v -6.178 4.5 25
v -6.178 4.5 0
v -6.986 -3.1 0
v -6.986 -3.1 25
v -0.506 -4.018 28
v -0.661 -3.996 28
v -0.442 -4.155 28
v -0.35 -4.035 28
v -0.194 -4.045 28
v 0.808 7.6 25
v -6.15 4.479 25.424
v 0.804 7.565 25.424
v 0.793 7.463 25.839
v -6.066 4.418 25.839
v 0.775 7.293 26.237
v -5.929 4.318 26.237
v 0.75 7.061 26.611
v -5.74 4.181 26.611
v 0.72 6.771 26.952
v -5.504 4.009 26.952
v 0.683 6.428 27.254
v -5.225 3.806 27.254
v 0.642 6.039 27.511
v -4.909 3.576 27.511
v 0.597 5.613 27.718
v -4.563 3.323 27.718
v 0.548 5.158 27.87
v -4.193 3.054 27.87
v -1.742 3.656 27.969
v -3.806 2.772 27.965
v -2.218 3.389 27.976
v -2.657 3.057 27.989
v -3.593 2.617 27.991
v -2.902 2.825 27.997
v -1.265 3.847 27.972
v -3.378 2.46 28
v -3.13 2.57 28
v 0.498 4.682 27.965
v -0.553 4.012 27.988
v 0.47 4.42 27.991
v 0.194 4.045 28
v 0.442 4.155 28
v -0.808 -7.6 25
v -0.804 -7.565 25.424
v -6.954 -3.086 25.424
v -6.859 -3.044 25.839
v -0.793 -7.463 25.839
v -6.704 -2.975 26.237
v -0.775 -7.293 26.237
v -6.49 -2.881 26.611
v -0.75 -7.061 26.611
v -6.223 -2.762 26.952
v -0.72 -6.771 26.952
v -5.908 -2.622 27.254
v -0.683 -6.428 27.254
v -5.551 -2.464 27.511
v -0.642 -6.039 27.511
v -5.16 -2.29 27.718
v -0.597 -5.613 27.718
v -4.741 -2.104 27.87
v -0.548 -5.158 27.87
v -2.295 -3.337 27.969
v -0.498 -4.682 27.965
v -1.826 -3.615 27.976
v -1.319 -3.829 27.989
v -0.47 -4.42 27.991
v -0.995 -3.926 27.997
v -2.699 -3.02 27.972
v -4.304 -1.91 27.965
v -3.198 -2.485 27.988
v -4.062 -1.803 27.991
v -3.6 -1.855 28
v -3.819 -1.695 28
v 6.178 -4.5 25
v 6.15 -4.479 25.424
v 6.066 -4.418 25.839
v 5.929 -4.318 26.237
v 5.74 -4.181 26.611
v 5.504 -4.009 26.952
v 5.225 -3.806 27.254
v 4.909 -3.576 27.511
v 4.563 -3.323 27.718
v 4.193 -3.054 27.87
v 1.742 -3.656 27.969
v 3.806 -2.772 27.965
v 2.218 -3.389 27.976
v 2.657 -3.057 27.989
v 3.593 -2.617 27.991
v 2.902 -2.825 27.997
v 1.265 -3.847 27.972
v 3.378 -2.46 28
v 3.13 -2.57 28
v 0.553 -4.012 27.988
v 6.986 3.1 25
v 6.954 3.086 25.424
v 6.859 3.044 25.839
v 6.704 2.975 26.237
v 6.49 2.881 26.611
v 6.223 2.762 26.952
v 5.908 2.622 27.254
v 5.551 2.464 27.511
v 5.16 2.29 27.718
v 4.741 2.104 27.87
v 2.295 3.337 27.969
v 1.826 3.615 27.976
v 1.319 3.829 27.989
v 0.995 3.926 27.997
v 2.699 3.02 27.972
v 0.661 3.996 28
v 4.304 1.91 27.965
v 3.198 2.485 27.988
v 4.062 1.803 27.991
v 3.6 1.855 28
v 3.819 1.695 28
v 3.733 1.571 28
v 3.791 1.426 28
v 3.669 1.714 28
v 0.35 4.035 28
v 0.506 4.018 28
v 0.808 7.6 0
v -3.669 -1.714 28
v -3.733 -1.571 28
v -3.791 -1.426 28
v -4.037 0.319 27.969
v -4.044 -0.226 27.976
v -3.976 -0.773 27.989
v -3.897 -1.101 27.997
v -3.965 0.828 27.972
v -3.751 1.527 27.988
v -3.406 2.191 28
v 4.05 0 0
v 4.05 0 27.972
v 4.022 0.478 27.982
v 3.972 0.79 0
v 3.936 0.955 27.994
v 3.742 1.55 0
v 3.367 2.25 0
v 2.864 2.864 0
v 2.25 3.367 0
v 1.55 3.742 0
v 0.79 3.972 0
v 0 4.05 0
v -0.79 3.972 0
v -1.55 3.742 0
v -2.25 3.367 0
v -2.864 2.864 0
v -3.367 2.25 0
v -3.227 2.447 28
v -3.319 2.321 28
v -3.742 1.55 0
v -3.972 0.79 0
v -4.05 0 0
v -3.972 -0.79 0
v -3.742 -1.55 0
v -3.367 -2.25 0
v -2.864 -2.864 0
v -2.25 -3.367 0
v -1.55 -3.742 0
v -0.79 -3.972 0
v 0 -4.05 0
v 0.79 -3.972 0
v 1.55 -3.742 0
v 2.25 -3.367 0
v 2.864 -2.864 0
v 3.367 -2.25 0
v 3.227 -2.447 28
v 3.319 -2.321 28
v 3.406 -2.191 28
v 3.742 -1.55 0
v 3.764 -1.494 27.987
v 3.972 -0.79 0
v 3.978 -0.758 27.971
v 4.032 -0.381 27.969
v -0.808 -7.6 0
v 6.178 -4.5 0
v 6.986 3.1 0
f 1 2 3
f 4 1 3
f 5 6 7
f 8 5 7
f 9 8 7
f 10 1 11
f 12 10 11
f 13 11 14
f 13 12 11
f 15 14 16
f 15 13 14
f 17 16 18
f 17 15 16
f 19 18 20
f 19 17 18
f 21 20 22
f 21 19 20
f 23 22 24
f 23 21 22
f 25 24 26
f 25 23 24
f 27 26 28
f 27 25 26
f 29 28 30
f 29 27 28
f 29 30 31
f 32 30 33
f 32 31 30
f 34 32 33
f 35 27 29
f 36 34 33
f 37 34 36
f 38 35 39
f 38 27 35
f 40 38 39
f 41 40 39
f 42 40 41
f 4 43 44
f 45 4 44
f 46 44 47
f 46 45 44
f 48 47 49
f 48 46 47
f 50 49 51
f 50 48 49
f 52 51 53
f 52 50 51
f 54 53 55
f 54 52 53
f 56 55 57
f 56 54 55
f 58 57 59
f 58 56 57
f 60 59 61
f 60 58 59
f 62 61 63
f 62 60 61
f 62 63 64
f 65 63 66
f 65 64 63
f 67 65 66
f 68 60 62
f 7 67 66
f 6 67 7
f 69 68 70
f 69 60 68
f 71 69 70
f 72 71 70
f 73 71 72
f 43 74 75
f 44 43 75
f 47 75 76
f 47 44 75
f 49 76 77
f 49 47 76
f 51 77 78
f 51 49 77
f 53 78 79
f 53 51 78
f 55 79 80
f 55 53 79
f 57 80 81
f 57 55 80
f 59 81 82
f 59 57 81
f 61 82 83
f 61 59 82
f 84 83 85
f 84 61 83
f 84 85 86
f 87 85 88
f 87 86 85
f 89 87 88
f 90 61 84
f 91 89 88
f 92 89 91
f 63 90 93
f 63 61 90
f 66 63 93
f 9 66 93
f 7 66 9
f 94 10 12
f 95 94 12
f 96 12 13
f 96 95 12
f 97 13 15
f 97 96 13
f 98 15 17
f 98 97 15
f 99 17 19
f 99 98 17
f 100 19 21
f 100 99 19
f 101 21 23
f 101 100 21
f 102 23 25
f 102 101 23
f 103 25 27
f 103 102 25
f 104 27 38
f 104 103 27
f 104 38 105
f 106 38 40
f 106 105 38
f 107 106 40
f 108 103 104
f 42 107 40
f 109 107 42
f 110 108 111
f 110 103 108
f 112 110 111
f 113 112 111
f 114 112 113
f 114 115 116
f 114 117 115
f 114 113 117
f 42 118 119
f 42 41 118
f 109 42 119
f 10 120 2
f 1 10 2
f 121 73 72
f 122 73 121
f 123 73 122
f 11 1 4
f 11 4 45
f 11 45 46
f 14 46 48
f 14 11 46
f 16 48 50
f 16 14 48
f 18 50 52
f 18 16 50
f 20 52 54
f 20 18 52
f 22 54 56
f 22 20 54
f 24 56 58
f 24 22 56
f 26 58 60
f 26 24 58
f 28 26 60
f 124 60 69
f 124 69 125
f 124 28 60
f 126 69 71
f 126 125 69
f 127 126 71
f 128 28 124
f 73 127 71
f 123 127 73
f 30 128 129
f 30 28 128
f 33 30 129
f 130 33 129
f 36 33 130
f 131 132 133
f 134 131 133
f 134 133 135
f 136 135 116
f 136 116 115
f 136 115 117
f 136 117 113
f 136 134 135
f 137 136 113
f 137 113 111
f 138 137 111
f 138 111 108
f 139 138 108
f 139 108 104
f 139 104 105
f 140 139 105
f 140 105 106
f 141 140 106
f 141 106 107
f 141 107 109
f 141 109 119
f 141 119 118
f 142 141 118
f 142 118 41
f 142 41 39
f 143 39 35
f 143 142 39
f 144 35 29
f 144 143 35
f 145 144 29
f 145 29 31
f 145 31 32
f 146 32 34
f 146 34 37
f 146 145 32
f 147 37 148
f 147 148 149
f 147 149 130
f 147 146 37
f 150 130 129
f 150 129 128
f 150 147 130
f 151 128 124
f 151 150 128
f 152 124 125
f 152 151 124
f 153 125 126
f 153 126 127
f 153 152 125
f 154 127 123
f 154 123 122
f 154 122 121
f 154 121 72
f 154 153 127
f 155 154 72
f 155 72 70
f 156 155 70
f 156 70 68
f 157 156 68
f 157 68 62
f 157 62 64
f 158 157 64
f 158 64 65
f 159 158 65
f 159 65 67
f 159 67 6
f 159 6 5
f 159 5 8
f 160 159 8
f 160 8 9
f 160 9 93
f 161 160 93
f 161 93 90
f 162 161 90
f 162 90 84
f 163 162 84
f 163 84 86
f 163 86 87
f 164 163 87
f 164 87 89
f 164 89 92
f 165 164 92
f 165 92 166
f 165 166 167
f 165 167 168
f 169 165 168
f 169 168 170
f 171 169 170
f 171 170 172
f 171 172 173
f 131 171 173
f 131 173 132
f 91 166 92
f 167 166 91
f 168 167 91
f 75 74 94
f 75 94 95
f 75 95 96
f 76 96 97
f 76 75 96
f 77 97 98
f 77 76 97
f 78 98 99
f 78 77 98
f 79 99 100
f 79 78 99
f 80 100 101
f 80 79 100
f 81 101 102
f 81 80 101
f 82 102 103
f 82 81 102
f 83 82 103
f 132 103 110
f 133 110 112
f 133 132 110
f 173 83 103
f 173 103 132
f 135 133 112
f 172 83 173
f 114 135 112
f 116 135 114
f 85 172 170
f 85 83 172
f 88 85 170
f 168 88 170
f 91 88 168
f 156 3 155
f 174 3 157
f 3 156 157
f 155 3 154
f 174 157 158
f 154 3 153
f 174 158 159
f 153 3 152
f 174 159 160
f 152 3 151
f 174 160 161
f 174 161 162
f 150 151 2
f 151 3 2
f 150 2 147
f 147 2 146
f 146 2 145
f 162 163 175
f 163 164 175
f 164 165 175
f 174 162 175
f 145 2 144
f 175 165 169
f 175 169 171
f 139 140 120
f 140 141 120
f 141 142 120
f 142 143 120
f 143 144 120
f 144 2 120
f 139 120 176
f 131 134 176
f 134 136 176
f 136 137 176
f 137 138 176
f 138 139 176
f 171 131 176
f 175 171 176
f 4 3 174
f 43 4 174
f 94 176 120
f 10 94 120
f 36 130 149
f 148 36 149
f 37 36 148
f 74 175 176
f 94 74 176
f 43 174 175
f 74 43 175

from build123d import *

# Parameters (mm, degrees)
F0_R         = 4.05
F1_DEPTH     = 28
F2_T1_DEPTH  = 22.6428048889
F2_T3_DEPTH  = 22.6428048889
F2_T5_DEPTH  = 22.6428048889
F2_T7_DEPTH  = 22.6428048889
F2_T9_DEPTH  = 22.6428048889
F2_T11_DEPTH = 22.6428048889


# Not quite as in the source:
# - a fillet or chamfer that OpenCascade refuses, or shapes differently, is made with other operations: its cross-section is extruded or revolved along the edge and cut away or added


with BuildPart() as f1:
    # F0 (on Top) → F1 (new body)
    with BuildSketch(Plane.XY):
        Polygon((6.1779160549, -4.4995355079), (6.9856700826, 3.1004644921), (0.8077540276, 7.6), (-6.1779160549, 4.4995355079), (-6.9856700826, -3.1004644921), (-0.8077540276, -7.6), align=None)
        Circle(F0_R, mode=Mode.SUBTRACT)
    extrude(amount=F1_DEPTH)

    # F2: fillet of radius 3 on 6 edges, made by hand

    # F2_s2 → F2_t1 (cut)
    with BuildSketch(Plane(origin=(-10.3479787197, -4.5927649325, 0), x_dir=(0, 0, 1), z_dir=(0.9140191571, 0.4056710249, 0))):
        with BuildLine():
            ThreePointArc((25, 6.6188631899), (27.1213203436, 5.7401835335), (28, 3.6188631899))
            Line((28, 3.6188631899), (28, 6.6188631899))
            Line((28, 6.6188631899), (25, 6.6188631899))
        make_face()
    extrude(amount=F2_T1_DEPTH, mode=Mode.SUBTRACT)

    # F2_s4 → F2_t3 (cut)
    with BuildSketch(Plane(origin=(-9.151440465, 6.6652299829, 0), x_dir=(0, 0, 1), z_dir=(0.8083309917, -0.5887282972, 0))):
        with BuildLine():
            ThreePointArc((25, 6.6188631899), (27.1213203436, 5.7401835335), (28, 3.6188631899))
            Line((28, 3.6188631899), (28, 6.6188631899))
            Line((28, 6.6188631899), (25, 6.6188631899))
        make_face()
    extrude(amount=F2_T3_DEPTH, mode=Mode.SUBTRACT)

    # F2_s6 → F2_t5 (cut)
    with BuildSketch(Plane(origin=(1.1965382547, 11.2579949153, 0), x_dir=(0, 0, 1), z_dir=(-0.1056881655, -0.994399322, 0))):
        with BuildLine():
            ThreePointArc((25, 6.6188631899), (27.1213203436, 5.7401835335), (28, 3.6188631899))
            Line((28, 3.6188631899), (28, 6.6188631899))
            Line((28, 6.6188631899), (25, 6.6188631899))
        make_face()
    extrude(amount=F2_T5_DEPTH, mode=Mode.SUBTRACT)

    # F2_s8 → F2_t7 (cut)
    with BuildSketch(Plane(origin=(10.3479787197, 4.5927649325, 0), x_dir=(0, 0, 1), z_dir=(-0.9140191571, -0.4056710249, 0))):
        with BuildLine():
            ThreePointArc((25, 6.6188631899), (27.1213203436, 5.7401835335), (28, 3.6188631899))
            Line((28, 3.6188631899), (28, 6.6188631899))
            Line((28, 6.6188631899), (25, 6.6188631899))
        make_face()
    extrude(amount=F2_T7_DEPTH, mode=Mode.SUBTRACT)

    # F2_s10 → F2_t9 (cut)
    with BuildSketch(Plane(origin=(9.151440465, -6.6652299829, 0), x_dir=(0, 0, 1), z_dir=(-0.8083309917, 0.5887282972, 0))):
        with BuildLine():
            ThreePointArc((25, 6.6188631899), (27.1213203436, 5.7401835335), (28, 3.6188631899))
            Line((28, 3.6188631899), (28, 6.6188631899))
            Line((28, 6.6188631899), (25, 6.6188631899))
        make_face()
    extrude(amount=F2_T9_DEPTH, mode=Mode.SUBTRACT)

    # F2_s12 → F2_t11 (cut)
    with BuildSketch(Plane(origin=(-1.1965382547, -11.2579949153, 0), x_dir=(0, 0, 1), z_dir=(0.1056881655, 0.994399322, 0))):
        with BuildLine():
            ThreePointArc((25, 6.6188631899), (27.1213203436, 5.7401835335), (28, 3.6188631899))
            Line((28, 3.6188631899), (28, 6.6188631899))
            Line((28, 6.6188631899), (25, 6.6188631899))
        make_face()
    extrude(amount=F2_T11_DEPTH, mode=Mode.SUBTRACT)


solid = f1.part
